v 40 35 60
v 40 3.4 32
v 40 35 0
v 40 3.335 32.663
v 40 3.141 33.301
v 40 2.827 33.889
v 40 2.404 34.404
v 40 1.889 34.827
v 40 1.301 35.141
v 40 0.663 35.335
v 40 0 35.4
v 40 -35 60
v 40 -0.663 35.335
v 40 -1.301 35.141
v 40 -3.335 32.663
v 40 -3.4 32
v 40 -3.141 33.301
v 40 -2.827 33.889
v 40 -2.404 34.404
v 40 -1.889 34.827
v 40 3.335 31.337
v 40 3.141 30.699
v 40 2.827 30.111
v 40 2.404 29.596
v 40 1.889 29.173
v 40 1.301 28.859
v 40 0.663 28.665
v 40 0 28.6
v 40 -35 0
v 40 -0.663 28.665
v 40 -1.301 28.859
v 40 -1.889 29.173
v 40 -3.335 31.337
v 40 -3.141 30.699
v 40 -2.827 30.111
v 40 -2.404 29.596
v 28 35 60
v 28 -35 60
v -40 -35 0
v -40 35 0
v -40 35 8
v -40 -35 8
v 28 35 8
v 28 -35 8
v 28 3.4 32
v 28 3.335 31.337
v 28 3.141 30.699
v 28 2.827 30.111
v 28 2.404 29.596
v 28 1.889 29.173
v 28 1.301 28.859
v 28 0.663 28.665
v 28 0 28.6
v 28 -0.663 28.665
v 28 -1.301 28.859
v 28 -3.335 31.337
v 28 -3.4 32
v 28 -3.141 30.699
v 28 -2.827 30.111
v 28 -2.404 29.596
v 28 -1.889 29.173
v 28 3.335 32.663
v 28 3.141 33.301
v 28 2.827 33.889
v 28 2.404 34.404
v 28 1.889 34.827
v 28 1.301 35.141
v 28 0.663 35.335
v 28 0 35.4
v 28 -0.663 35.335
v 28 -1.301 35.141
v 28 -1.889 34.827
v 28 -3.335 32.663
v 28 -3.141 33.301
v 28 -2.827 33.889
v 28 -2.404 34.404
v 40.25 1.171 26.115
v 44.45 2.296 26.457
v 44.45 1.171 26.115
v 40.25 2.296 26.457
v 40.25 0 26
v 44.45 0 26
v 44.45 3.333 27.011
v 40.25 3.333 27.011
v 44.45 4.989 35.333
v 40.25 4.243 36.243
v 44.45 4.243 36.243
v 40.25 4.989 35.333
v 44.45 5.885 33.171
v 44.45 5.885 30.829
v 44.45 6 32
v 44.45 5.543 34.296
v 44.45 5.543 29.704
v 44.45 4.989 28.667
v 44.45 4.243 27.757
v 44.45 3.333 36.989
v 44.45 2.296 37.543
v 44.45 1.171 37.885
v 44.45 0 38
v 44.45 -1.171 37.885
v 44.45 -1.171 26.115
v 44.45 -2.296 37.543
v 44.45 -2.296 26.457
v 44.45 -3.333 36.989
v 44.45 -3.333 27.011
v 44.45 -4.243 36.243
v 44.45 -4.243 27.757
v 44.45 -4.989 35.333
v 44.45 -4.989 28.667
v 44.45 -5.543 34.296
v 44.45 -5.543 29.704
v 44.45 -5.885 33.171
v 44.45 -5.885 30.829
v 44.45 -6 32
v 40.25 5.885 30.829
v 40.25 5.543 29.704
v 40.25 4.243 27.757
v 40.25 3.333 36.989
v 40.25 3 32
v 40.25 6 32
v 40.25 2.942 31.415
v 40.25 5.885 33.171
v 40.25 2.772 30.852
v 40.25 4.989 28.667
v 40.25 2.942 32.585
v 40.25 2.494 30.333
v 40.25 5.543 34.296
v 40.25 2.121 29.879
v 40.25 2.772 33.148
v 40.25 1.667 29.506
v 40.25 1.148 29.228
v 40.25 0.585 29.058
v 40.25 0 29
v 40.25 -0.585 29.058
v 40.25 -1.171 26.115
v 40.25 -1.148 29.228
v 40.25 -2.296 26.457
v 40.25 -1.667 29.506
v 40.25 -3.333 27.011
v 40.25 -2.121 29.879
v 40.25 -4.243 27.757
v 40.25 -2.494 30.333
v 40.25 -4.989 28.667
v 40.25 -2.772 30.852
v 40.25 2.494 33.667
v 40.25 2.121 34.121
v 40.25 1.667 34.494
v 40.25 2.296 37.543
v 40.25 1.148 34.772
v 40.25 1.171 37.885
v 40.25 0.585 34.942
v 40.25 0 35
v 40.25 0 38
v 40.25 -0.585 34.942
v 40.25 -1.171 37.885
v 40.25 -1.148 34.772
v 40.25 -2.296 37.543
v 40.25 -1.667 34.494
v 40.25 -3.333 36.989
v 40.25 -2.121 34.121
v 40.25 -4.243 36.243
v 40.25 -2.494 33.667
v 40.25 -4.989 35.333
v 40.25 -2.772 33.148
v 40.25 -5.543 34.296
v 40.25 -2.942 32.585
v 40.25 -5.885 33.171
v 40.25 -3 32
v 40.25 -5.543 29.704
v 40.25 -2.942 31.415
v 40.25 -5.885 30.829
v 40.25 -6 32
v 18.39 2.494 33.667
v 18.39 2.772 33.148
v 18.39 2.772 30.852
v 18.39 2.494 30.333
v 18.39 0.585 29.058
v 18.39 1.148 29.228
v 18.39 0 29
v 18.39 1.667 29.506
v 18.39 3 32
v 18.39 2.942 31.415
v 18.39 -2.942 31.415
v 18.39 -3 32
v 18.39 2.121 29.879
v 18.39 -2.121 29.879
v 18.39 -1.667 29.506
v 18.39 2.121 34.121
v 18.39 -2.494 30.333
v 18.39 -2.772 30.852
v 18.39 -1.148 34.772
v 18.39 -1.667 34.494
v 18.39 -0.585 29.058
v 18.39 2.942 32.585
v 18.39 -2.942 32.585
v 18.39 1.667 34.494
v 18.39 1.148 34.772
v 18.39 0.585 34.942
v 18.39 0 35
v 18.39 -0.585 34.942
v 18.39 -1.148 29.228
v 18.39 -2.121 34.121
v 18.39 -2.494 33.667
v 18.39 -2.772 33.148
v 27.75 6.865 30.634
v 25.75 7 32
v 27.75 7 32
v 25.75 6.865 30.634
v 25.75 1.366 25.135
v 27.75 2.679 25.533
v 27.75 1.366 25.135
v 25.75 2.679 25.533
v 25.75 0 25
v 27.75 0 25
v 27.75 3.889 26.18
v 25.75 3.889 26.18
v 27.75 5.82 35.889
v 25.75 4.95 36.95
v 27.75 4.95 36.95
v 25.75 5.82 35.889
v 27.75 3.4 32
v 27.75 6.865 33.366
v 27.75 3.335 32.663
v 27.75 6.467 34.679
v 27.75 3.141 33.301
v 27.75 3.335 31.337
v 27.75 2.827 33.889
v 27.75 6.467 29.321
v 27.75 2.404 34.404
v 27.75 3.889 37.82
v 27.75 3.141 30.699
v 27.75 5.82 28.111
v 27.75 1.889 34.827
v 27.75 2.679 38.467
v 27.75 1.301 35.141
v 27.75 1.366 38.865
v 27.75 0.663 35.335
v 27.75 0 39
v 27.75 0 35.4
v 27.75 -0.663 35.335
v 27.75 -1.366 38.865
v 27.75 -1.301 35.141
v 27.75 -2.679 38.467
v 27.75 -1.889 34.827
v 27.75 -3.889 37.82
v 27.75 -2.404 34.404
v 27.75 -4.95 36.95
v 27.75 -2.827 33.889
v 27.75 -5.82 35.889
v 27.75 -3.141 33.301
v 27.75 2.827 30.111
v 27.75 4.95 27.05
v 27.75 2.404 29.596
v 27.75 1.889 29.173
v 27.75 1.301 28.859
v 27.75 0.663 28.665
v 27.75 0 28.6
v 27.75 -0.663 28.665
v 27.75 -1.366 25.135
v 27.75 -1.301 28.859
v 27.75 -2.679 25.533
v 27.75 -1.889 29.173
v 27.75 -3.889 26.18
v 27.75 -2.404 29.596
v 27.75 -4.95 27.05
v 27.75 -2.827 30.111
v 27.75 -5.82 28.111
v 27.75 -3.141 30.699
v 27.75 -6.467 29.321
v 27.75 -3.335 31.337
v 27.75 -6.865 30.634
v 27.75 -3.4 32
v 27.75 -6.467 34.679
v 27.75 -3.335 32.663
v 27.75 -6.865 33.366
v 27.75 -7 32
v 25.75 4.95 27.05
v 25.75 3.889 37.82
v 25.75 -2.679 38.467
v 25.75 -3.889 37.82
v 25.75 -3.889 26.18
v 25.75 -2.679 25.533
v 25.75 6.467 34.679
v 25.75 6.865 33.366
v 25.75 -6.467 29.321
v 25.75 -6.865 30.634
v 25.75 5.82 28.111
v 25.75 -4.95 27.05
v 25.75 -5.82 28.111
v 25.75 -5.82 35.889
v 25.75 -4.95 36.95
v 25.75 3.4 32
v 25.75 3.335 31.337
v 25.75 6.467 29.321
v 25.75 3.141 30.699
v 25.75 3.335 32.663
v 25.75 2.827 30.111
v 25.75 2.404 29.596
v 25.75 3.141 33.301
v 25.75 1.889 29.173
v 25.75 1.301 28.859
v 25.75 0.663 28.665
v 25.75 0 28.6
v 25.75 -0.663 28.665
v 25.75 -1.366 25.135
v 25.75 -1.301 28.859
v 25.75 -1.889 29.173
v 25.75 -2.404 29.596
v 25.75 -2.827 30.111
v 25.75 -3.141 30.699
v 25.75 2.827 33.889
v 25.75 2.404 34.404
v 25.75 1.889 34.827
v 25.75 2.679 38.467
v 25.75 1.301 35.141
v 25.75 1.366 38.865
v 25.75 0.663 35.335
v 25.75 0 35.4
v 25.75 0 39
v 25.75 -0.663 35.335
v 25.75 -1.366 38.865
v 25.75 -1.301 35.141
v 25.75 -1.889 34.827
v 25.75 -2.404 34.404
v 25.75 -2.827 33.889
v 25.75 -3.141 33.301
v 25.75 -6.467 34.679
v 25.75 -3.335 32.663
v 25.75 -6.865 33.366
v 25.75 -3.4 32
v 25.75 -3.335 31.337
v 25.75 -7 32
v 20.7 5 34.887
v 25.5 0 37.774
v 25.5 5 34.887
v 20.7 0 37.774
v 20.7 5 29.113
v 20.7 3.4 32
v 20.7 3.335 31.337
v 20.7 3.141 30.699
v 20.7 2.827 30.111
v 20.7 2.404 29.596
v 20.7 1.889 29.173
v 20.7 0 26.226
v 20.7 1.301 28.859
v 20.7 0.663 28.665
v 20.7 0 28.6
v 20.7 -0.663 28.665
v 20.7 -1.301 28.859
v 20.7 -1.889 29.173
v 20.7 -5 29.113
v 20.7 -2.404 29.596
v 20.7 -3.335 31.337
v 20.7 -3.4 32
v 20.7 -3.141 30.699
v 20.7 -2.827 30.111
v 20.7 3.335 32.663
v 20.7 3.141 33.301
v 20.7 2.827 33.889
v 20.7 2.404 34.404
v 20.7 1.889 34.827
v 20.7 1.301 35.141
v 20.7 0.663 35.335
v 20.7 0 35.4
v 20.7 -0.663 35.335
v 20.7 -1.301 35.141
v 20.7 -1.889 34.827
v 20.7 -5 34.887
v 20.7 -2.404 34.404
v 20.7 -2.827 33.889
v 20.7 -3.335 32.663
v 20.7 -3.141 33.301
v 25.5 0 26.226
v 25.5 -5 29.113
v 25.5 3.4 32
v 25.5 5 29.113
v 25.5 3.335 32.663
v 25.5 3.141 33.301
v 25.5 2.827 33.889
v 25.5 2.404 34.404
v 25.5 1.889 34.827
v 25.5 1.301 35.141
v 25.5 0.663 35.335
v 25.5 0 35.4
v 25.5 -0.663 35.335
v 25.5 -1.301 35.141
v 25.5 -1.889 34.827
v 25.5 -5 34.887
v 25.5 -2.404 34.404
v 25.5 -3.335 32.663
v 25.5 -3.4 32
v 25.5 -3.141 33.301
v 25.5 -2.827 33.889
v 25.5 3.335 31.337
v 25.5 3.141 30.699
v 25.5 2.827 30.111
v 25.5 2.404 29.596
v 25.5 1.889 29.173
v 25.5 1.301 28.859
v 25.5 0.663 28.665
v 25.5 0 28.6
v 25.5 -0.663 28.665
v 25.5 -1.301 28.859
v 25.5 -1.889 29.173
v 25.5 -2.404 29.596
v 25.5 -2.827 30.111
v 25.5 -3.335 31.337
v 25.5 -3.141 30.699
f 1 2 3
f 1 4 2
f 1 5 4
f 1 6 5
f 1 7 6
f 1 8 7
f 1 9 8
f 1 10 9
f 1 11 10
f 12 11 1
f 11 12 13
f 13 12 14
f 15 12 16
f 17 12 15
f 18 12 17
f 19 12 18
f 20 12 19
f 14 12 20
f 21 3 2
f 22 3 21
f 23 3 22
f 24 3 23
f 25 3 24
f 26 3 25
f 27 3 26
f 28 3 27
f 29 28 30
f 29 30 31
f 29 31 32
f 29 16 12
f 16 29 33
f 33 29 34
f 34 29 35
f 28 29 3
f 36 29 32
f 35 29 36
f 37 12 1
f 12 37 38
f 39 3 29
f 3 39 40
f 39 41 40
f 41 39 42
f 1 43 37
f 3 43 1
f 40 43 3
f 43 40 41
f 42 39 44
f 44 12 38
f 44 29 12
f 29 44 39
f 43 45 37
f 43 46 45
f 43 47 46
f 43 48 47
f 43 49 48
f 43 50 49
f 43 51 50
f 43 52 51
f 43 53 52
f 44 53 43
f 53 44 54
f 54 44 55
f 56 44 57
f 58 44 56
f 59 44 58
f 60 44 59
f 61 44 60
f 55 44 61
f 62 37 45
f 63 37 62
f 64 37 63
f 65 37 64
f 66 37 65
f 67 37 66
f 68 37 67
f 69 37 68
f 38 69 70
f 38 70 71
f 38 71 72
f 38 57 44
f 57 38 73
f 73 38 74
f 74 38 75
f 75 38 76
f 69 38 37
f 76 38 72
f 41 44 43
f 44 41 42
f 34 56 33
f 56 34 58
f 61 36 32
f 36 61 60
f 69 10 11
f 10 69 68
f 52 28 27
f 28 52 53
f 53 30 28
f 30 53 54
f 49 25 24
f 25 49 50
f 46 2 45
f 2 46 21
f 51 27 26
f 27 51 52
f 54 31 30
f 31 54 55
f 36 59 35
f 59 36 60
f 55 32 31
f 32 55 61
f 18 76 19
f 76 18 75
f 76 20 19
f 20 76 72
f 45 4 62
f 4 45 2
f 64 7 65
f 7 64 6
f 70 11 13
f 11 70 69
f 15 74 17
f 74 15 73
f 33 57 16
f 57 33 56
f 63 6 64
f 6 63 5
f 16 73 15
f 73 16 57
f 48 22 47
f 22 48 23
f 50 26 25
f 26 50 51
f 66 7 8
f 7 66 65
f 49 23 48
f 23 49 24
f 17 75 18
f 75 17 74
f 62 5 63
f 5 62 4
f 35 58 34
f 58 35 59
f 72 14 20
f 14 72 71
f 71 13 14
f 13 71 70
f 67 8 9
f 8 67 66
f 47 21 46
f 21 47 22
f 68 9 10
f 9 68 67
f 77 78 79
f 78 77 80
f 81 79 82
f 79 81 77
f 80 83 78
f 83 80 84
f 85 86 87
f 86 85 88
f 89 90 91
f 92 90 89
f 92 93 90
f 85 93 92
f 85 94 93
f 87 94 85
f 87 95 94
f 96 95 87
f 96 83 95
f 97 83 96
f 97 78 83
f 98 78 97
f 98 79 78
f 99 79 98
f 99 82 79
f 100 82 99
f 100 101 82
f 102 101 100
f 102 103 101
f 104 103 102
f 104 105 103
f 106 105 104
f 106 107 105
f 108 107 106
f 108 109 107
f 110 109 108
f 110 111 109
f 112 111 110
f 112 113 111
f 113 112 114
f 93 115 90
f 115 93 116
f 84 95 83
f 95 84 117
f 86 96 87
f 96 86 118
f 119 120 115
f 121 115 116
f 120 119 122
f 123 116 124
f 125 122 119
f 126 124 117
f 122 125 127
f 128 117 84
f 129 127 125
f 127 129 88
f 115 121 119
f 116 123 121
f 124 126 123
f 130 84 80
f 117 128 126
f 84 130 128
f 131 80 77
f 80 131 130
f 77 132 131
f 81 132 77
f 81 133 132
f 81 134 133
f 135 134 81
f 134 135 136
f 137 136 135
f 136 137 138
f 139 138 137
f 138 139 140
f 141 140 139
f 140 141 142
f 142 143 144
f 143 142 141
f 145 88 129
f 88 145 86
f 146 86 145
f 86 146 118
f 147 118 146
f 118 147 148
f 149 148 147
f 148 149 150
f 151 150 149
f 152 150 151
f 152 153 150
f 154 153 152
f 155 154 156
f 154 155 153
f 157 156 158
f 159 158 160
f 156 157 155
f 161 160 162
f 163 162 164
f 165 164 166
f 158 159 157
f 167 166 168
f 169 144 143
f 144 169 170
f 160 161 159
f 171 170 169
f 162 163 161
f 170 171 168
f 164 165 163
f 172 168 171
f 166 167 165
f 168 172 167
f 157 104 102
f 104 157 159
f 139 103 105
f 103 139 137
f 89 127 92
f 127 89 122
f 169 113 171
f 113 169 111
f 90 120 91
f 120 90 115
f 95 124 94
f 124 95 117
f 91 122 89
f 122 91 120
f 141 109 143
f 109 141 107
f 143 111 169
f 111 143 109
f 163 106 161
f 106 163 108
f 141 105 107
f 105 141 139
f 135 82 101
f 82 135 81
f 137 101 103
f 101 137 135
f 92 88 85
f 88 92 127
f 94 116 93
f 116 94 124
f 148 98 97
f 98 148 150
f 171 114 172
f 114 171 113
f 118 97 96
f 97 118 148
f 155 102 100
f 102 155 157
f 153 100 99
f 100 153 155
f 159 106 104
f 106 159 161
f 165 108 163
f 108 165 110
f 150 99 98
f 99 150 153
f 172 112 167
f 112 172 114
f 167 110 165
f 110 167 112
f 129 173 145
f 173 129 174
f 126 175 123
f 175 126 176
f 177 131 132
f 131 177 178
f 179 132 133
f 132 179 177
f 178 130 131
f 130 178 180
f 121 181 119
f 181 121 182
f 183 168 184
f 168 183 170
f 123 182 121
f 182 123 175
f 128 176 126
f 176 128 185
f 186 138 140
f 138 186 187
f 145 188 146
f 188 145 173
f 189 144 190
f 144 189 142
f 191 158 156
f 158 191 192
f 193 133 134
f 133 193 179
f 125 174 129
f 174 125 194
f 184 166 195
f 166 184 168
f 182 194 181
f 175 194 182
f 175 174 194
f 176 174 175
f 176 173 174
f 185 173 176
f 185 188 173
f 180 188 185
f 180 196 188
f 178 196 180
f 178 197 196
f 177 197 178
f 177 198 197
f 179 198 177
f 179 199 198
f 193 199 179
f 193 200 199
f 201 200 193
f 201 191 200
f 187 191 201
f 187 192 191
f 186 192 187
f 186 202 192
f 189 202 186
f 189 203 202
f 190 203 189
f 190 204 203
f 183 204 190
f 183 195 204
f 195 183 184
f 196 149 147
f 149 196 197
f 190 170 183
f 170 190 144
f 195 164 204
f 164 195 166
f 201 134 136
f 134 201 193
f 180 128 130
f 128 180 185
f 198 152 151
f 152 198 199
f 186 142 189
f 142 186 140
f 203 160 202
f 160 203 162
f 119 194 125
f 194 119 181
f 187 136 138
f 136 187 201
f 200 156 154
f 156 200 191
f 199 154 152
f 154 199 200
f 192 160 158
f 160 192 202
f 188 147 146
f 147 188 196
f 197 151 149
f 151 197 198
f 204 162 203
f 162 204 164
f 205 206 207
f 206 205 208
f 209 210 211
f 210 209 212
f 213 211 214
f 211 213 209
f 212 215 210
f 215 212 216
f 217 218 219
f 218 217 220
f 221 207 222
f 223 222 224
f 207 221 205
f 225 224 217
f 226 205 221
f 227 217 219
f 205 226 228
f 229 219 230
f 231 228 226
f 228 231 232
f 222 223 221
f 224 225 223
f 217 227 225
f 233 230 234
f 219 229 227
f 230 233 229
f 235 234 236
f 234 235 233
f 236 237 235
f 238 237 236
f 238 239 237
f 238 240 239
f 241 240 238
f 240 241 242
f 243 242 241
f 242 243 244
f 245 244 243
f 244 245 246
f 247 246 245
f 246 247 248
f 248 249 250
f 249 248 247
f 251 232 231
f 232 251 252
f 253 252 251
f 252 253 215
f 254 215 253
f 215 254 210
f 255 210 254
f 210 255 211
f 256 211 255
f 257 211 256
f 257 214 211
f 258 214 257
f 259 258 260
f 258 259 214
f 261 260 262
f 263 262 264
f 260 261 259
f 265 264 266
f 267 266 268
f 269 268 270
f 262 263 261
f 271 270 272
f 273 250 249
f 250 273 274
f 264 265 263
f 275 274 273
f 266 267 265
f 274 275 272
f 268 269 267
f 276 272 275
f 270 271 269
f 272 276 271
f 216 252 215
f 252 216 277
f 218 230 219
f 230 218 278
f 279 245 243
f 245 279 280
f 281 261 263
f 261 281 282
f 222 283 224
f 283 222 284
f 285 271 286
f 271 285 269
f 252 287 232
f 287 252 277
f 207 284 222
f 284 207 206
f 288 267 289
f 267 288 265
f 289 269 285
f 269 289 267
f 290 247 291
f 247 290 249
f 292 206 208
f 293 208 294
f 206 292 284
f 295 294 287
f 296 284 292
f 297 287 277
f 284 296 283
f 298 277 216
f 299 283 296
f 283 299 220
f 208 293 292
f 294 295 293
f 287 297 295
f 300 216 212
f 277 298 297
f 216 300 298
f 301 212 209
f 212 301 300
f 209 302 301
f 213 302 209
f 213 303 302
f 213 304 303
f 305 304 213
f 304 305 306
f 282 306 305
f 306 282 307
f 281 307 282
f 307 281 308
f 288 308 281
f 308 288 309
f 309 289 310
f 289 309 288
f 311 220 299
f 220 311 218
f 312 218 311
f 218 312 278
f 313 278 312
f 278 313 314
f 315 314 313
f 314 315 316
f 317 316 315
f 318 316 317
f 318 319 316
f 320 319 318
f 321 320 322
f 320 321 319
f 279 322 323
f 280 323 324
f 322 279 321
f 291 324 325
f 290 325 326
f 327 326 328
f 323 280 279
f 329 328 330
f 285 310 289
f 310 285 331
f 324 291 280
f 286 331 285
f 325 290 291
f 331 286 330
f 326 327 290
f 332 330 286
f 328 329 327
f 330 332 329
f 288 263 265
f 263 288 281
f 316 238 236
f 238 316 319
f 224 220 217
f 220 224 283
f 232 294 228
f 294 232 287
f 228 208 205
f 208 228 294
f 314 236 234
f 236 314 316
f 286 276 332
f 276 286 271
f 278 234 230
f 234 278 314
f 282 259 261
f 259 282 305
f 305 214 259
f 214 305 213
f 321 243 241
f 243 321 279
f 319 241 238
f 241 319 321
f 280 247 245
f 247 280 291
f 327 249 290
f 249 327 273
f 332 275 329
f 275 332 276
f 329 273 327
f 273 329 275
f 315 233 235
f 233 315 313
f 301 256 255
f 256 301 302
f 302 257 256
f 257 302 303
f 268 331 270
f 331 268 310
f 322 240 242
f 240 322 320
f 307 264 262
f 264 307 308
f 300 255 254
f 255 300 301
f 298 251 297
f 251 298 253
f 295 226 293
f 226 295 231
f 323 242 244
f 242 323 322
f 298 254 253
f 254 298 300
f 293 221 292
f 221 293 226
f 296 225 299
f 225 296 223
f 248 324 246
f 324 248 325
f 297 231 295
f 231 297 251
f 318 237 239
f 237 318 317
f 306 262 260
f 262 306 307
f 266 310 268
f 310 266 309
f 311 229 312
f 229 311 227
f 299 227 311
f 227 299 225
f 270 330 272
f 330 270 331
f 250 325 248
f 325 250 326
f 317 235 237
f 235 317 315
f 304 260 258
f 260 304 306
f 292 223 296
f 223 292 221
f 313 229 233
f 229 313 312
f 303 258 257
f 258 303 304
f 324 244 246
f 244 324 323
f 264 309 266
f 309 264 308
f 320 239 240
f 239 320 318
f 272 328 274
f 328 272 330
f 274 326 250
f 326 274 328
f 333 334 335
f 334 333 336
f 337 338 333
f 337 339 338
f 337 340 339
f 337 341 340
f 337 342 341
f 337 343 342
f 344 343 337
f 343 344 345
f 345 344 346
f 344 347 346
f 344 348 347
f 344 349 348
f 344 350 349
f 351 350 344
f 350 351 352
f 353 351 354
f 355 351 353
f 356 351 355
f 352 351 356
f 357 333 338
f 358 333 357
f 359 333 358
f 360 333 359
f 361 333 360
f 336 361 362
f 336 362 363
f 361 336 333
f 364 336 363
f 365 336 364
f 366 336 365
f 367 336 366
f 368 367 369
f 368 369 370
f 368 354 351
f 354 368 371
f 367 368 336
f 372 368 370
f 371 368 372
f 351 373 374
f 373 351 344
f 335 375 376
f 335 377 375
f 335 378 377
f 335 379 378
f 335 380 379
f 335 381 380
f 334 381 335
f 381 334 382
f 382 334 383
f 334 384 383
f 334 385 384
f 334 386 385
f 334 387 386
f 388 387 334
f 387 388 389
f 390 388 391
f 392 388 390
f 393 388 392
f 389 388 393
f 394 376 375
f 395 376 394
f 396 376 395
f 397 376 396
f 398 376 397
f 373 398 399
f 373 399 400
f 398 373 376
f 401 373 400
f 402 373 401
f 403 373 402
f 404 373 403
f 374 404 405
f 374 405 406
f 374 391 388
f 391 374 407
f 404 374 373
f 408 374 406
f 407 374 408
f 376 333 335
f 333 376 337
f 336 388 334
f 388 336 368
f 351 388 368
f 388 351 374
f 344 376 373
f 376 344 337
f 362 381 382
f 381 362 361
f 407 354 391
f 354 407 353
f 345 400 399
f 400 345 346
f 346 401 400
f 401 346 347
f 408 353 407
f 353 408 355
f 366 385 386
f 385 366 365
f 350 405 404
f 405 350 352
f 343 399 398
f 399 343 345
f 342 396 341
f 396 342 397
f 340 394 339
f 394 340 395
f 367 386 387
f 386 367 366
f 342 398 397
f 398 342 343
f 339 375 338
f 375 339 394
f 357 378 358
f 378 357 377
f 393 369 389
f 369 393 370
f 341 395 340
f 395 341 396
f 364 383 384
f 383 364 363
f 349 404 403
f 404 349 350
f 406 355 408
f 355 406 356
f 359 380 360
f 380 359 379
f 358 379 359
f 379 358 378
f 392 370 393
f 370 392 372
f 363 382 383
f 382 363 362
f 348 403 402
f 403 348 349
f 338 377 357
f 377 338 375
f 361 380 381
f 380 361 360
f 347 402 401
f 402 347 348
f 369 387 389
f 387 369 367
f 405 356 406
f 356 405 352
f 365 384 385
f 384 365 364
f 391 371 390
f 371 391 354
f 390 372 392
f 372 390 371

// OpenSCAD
$fn = 32;

// ------------------------------------------------------------------------
// Bolted bracket: 80 x 70 mm bracket with 1 bolt joints
// Every part is its own module, assembly() places them once.
// ------------------------------------------------------------------------

// --- part 1 ---
module bracket() {
  difference() {
    translate([-40, -35, 0]) cube([80, 70, 60]);
    translate([-41, -36, 8]) cube([69, 72, 53]);
    translate([34, 0, 32]) rotate([0, 90, 0]) cylinder(h = 14, d = 6.8, center = true);
  }
}

// --- part 2 ---
module bolt() {
  cylinder(h = 4.2, d = 12);
  translate([0, 0, -21.86]) cylinder(h = 21.86, d = 6);
}

// --- part 3 ---
module washer() {
  difference() {
      translate([0, 0, 0]) cylinder(h = 2, d = 14);
      translate([0, 0, -1]) cylinder(h = 4, d = 6.8);
    }
}

// --- part 4 ---
module nut() {
  difference() {
    linear_extrude(height = 4.8) polygon(points = [[5.774, 0], [2.887, 5], [-2.887, 5], [-5.774, 0], [-2.887, -5], [2.887, -5]]);
    translate([0, 0, -1]) cylinder(h = 6.8, d = 6.8);
  }
}

// --- assembly ---
module assembly() {
  translate([0, 0, 0]) rotate([0, 0, 0]) bracket();
  translate([40.25, 0, 32]) rotate([0, 90, 0]) bolt();
  translate([25.75, 0, 32]) rotate([0, 90, 0]) washer();
  translate([20.7, 0, 32]) rotate([0, 90, 0]) nut();
}

assembly();
